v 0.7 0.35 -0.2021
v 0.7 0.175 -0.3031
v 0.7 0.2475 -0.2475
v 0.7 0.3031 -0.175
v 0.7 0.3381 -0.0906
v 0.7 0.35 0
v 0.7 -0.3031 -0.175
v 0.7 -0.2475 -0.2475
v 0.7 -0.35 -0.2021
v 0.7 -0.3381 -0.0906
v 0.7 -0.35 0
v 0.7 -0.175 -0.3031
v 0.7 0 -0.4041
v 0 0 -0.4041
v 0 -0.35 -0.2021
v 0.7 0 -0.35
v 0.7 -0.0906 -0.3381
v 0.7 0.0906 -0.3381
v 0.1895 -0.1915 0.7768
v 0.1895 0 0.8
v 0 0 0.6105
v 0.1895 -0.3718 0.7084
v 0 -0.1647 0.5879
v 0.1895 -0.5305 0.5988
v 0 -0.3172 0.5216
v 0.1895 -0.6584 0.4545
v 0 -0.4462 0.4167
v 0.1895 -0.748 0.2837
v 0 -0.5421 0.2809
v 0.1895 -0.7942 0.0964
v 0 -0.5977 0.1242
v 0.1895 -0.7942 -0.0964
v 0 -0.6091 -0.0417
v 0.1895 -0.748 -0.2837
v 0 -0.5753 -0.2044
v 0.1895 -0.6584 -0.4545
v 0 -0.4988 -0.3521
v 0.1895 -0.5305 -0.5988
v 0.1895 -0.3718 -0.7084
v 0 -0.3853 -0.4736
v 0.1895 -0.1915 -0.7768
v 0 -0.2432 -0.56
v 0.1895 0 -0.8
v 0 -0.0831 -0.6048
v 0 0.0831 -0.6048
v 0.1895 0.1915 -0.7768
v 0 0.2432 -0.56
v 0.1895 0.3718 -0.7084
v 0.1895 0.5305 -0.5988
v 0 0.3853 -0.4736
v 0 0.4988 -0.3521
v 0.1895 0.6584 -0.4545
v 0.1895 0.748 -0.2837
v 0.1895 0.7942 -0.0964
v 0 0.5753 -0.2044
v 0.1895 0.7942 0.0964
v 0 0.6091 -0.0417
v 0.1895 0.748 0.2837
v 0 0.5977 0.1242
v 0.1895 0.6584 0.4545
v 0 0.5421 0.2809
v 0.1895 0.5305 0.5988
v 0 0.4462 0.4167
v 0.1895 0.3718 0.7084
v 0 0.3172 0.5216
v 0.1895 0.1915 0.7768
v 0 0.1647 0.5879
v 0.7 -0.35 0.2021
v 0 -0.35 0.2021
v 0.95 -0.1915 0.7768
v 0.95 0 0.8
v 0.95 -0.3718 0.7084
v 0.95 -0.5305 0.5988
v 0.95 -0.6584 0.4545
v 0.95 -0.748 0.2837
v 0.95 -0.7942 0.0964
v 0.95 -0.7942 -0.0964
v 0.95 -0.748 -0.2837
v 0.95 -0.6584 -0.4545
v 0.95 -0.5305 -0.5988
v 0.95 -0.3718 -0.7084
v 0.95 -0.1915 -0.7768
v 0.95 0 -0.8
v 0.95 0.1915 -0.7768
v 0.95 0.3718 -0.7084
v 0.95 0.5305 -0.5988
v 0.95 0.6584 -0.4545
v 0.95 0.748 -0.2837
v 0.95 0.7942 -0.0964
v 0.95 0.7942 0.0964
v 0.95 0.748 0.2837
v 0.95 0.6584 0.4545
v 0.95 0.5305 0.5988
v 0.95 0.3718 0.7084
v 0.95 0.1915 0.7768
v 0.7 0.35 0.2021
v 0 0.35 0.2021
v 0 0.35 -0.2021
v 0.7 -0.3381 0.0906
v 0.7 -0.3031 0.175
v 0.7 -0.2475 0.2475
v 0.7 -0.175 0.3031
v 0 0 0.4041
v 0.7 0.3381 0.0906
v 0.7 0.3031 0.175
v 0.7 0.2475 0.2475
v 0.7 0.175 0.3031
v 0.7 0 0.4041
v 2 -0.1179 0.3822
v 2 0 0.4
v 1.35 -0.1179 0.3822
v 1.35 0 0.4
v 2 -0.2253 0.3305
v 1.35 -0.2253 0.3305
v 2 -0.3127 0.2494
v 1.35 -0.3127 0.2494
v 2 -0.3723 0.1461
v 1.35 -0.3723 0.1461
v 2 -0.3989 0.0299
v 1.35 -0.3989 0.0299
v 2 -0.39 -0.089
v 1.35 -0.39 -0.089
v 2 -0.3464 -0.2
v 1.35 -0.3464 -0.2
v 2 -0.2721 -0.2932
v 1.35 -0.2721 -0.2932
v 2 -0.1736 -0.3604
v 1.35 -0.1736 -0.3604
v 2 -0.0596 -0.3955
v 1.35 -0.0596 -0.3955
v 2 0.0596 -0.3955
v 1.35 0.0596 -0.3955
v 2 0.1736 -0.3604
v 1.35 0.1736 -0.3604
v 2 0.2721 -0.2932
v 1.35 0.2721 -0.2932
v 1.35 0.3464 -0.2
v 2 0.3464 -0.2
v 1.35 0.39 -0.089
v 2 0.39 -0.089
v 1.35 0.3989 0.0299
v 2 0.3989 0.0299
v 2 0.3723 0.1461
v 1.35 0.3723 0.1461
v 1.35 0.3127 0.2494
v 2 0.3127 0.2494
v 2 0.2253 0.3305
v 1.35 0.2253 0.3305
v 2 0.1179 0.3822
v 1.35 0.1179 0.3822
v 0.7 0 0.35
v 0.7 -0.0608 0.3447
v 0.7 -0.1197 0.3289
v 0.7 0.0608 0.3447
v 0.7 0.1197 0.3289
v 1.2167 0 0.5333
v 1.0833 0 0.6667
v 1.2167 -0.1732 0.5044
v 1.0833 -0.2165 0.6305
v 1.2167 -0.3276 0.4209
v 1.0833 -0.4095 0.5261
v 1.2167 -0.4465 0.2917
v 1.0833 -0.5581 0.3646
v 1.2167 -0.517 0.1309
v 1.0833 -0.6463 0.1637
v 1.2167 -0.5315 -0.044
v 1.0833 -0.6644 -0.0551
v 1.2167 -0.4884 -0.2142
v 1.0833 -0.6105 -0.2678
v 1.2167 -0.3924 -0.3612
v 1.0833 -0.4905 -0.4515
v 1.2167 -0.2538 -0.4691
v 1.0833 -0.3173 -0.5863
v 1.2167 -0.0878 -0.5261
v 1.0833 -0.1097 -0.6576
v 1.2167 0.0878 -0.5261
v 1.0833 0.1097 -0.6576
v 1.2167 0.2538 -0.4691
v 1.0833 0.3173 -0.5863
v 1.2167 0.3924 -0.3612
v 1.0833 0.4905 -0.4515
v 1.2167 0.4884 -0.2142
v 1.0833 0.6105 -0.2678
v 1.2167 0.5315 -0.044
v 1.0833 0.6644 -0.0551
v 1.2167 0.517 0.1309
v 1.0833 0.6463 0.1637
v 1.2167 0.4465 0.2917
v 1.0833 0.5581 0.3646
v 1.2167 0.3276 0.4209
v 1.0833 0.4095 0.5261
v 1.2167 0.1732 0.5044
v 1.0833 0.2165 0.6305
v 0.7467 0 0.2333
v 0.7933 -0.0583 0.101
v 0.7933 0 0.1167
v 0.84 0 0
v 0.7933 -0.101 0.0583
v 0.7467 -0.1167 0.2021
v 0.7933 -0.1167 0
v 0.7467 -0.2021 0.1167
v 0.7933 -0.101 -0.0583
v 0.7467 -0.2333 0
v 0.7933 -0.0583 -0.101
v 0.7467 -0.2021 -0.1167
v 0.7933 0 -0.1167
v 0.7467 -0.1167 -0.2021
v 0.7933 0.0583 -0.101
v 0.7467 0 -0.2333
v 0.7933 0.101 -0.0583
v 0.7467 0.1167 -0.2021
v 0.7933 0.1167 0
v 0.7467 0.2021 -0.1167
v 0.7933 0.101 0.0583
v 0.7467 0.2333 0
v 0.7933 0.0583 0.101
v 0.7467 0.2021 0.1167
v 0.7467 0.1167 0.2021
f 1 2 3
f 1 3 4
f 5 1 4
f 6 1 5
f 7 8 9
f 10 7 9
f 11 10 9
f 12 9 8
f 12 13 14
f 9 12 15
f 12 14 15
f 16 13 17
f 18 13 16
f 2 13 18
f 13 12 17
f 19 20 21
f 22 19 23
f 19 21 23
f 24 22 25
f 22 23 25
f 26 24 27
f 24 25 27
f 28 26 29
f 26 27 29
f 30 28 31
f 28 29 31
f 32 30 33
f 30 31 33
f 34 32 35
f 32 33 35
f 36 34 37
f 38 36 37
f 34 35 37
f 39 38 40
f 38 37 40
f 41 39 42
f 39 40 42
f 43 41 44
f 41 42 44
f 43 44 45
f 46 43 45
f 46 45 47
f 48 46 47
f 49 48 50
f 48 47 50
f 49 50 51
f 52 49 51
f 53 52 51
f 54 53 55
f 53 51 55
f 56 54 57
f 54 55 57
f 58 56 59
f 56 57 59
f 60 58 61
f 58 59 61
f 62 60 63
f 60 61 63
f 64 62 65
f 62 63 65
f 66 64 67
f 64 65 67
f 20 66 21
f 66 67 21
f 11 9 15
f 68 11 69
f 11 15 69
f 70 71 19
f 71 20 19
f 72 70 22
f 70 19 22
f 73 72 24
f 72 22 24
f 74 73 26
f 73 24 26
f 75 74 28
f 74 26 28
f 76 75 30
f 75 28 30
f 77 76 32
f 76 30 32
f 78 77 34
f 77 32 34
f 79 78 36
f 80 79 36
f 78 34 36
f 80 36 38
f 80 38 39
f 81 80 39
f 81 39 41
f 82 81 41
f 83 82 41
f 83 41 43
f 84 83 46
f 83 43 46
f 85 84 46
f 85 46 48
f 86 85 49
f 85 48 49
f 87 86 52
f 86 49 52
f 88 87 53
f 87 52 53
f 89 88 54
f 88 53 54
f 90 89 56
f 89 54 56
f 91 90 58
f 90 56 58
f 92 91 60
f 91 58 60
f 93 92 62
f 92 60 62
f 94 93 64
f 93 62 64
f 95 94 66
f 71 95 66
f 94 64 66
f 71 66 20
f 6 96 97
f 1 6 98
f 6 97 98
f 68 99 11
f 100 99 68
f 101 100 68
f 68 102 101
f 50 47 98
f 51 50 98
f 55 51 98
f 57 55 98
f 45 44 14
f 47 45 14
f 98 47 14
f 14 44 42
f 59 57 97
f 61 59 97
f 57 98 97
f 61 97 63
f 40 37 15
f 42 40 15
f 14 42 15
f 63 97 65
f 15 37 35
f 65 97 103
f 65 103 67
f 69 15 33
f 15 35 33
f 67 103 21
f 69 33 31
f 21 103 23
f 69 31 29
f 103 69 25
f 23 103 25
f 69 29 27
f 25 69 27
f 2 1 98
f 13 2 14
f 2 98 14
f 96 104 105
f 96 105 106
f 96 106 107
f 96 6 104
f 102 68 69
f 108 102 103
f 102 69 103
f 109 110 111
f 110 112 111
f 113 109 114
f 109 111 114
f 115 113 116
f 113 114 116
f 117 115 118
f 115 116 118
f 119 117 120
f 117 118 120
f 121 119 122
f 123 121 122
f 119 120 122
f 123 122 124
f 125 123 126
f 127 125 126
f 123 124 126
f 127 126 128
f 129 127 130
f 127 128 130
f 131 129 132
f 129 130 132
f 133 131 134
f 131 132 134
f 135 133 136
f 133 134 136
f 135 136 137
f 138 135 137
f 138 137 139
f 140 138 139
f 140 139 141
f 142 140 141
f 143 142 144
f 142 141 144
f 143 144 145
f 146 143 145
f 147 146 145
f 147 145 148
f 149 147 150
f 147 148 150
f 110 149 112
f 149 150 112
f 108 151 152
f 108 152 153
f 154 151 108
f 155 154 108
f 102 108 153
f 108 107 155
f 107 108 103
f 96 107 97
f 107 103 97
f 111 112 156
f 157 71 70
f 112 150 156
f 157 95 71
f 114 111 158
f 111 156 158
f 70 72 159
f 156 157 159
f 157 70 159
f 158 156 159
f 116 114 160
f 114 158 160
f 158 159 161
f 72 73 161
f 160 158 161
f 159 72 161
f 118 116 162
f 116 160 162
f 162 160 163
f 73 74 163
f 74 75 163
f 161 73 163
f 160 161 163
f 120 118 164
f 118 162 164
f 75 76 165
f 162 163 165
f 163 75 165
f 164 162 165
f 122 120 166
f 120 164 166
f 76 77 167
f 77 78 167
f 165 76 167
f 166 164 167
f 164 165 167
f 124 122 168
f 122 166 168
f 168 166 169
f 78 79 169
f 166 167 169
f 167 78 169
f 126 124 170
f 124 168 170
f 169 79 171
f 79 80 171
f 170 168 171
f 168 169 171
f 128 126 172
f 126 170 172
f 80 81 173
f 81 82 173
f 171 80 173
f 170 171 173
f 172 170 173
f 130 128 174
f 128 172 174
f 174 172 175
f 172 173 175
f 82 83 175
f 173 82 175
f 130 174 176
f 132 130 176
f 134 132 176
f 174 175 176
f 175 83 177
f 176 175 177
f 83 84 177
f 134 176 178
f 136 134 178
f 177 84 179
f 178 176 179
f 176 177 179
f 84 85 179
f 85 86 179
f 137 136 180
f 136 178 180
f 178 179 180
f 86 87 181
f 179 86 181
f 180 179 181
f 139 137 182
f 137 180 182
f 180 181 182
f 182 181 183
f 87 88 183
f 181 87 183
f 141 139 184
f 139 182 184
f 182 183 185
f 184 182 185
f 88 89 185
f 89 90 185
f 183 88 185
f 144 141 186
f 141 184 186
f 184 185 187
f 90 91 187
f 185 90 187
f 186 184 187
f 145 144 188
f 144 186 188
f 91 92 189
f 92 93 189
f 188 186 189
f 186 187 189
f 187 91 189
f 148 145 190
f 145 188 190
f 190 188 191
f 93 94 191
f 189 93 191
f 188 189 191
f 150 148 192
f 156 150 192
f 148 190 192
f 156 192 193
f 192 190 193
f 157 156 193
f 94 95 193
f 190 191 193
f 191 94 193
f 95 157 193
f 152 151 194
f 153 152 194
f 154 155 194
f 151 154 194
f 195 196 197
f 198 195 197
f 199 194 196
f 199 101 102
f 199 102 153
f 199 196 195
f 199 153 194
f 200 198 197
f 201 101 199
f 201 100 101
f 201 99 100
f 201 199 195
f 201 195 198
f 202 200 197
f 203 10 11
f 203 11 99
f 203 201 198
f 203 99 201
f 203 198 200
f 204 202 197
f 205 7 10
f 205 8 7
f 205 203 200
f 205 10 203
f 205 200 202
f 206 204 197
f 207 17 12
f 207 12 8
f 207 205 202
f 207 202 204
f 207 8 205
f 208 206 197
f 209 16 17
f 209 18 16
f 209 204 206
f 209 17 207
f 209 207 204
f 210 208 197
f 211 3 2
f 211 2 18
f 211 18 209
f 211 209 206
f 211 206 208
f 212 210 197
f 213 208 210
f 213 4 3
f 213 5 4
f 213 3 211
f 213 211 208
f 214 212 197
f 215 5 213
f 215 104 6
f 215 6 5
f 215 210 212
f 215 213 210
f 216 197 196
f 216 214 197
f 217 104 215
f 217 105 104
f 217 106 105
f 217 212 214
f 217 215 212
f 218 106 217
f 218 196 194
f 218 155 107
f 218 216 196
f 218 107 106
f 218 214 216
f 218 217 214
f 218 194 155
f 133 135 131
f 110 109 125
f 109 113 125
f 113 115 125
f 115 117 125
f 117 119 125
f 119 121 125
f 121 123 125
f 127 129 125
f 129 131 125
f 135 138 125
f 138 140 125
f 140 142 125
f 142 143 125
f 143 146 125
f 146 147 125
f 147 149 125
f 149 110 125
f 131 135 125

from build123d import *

# Parameters (mm, degrees)
HEXAGONSOCKET_DEPTH = 0.7


with BuildPart() as part:
    # Sketch1 → Base (revolve)
    with BuildSketch(Plane.XY, mode=Mode.PRIVATE) as base_sk:
        Polygon((0, 0), (2, 0), (2, 0.4), (1.35, 0.4), (0.95, 0.8), (0.1895, 0.8), (0, 0.6105), align=None)
    revolve(base_sk.sketch.rotate(Axis((-1.968820569, 0, 0), (1, 0, 0)), 90), axis=Axis((-1.968820569, 0, 0), (1, 0, 0)))

    # Sketch2 → HexagonSocket (cut)
    with BuildSketch(Plane(origin=(0, -1.128463942, -0.35035393), x_dir=(0, 0, 1), z_dir=(-1, 0, 0))):
        Polygon((0.754499118, 1.128463942), (0.552426524, 1.478463942), (0.148281336, 1.478463942), (-0.053791259, 1.128463942), (0.148281336, 0.778463942), (0.552426524, 0.778463942), align=None)
    extrude(amount=-HEXAGONSOCKET_DEPTH, mode=Mode.SUBTRACT)

    # Sketch3 → Cut-Revolve1 (revolve, cut)
    with BuildSketch(Plane.XY, mode=Mode.PRIVATE) as cut_revolve1_sk:
        Polygon((0.7, 0.35), (0.7, 0), (0.84, 0), align=None)
    revolve(cut_revolve1_sk.sketch.rotate(Axis((-0.330994676, 0, 0), (1, 0, 0)), 90), axis=Axis((-0.330994676, 0, 0), (1, 0, 0)), mode=Mode.SUBTRACT)


solid = part.part
